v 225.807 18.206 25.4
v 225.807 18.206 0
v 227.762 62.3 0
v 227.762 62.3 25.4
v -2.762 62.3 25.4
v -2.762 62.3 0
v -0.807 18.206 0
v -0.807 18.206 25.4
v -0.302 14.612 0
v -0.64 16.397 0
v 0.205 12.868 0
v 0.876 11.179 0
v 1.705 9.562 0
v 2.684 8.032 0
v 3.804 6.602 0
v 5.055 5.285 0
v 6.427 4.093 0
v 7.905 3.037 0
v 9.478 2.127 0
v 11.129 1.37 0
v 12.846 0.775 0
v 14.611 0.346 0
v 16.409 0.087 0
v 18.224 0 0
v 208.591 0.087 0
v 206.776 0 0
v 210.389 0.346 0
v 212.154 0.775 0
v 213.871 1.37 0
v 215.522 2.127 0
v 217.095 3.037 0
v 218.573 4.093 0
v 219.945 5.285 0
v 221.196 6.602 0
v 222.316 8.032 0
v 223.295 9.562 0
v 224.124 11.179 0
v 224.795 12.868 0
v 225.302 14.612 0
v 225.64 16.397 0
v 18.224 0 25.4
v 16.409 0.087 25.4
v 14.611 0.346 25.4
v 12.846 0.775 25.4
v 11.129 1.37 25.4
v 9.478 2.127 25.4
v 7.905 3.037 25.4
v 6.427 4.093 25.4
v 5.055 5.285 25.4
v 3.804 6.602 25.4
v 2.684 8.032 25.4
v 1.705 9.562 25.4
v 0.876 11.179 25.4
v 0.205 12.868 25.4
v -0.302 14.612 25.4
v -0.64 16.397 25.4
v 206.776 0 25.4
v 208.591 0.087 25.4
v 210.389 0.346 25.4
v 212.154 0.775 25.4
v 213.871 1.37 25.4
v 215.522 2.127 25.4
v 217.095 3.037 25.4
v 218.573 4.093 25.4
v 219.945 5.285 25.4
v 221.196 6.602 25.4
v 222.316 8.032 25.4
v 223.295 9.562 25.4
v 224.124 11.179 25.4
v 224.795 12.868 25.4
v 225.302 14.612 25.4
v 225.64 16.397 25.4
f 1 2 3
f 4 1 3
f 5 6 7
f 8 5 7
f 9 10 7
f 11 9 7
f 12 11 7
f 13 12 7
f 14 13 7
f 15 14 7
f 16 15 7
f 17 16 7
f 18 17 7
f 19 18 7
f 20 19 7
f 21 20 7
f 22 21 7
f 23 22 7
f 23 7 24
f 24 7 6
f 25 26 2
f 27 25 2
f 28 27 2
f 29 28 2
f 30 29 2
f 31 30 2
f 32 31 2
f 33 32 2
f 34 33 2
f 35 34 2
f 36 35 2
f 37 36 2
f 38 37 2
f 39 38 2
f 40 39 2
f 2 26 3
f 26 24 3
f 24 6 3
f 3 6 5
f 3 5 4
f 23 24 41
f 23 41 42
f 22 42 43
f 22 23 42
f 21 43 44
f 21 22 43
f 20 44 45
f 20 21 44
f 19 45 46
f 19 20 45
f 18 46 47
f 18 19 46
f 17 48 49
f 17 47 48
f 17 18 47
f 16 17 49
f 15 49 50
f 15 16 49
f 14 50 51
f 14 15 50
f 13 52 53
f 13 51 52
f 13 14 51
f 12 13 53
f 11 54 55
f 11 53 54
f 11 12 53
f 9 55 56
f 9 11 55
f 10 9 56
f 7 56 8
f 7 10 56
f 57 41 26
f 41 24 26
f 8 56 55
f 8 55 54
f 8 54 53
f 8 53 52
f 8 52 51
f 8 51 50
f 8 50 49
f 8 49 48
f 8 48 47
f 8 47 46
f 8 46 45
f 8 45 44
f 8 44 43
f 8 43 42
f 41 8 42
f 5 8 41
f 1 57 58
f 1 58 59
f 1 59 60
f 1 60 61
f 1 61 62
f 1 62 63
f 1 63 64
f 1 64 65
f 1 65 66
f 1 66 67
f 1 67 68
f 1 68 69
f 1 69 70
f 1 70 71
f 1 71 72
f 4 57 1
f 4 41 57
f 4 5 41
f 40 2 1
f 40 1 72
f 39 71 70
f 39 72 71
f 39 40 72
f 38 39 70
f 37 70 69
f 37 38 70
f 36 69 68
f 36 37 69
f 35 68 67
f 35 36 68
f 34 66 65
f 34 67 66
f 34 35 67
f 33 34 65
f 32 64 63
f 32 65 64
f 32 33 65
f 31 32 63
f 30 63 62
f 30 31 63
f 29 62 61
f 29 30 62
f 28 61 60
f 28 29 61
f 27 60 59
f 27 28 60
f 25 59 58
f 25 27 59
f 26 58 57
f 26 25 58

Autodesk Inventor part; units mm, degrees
ref_plane "YZ Plane" through (0, 0, 0) normal (1, 0, 0) x (0, 1, 0)
ref_plane "XZ Plane" through (0, 0, 0) normal (0, 1, 0) x (-1, 0, 0)
ref_plane "XY Plane" through (0, 0, 0) normal (0, 0, 1) x (1, 0, 0)
sketch "Sketch1" plane through (0, 0, 0) normal (0, 0, 1) x (1, 0, 0)
  line L0 (18.2242, 0) -> (206.7758, 0)
  line L1 (-6.65, 150) -> (231.65, 150)
  line L2 (-6.65, 150) -> (-0.8071, 18.2063)
  line L3 (225.8071, 18.2063) -> (231.65, 150)
  arc A0 (-0.8071, 18.2063) -> (18.2242, 0) centre (18.2242, 19.05) ccw
  arc A1 (206.7758, 0) -> (225.8071, 18.2063) centre (206.7758, 19.05) ccw
  line L4 (-14.1495, 62.3) -> (284.7503, 62.3)
  point P0 (0, 0)
  point P1 (225, 0)
  point P2 (112.5, 0)
  point P3 (112.5, 150)
  point P4 (227.762, 62.3)
  point P5 (-2.762, 62.3)
  dimension "d0" = 225
  dimension "d1" = 150
  dimension "d2" = 238.3
  dimension "d4" = 19.05
  dimension "d11" = 0
  dimension "d12" = 62.3
extrude "Extrusion1" add sketch "Sketch1" along normal blind 25.4 contours A0 L2 L4 L3 A1 L0
sketch "Sketch2" plane through (0, 0, 25.4) normal (0, 0, 1) x (1, 0, 0)
  line L0 (243.0343, 163.5066) -> (27.3006, 163.5066)
  line L1 (27.3006, 163.5066) -> (27.3006, 18.9917)
  line L2 (27.3006, 18.9917) -> (243.0343, 18.9917)
  line L3 (243.0343, 18.9917) -> (243.0343, 163.5066)
  line L4 (27.1522, 18.9917) -> (243.0343, 18.9917)
  line L5 (243.0343, 18.9917) -> (243.0343, -17.0628)
  line L6 (243.0343, -17.0628) -> (27.1522, -17.0628)
  line L7 (27.1522, -17.0628) -> (27.1522, 18.9917)
  point P0 (0, 0)
extrude "Test" [suppressed]
properties part number "Divider_3DPrint"
